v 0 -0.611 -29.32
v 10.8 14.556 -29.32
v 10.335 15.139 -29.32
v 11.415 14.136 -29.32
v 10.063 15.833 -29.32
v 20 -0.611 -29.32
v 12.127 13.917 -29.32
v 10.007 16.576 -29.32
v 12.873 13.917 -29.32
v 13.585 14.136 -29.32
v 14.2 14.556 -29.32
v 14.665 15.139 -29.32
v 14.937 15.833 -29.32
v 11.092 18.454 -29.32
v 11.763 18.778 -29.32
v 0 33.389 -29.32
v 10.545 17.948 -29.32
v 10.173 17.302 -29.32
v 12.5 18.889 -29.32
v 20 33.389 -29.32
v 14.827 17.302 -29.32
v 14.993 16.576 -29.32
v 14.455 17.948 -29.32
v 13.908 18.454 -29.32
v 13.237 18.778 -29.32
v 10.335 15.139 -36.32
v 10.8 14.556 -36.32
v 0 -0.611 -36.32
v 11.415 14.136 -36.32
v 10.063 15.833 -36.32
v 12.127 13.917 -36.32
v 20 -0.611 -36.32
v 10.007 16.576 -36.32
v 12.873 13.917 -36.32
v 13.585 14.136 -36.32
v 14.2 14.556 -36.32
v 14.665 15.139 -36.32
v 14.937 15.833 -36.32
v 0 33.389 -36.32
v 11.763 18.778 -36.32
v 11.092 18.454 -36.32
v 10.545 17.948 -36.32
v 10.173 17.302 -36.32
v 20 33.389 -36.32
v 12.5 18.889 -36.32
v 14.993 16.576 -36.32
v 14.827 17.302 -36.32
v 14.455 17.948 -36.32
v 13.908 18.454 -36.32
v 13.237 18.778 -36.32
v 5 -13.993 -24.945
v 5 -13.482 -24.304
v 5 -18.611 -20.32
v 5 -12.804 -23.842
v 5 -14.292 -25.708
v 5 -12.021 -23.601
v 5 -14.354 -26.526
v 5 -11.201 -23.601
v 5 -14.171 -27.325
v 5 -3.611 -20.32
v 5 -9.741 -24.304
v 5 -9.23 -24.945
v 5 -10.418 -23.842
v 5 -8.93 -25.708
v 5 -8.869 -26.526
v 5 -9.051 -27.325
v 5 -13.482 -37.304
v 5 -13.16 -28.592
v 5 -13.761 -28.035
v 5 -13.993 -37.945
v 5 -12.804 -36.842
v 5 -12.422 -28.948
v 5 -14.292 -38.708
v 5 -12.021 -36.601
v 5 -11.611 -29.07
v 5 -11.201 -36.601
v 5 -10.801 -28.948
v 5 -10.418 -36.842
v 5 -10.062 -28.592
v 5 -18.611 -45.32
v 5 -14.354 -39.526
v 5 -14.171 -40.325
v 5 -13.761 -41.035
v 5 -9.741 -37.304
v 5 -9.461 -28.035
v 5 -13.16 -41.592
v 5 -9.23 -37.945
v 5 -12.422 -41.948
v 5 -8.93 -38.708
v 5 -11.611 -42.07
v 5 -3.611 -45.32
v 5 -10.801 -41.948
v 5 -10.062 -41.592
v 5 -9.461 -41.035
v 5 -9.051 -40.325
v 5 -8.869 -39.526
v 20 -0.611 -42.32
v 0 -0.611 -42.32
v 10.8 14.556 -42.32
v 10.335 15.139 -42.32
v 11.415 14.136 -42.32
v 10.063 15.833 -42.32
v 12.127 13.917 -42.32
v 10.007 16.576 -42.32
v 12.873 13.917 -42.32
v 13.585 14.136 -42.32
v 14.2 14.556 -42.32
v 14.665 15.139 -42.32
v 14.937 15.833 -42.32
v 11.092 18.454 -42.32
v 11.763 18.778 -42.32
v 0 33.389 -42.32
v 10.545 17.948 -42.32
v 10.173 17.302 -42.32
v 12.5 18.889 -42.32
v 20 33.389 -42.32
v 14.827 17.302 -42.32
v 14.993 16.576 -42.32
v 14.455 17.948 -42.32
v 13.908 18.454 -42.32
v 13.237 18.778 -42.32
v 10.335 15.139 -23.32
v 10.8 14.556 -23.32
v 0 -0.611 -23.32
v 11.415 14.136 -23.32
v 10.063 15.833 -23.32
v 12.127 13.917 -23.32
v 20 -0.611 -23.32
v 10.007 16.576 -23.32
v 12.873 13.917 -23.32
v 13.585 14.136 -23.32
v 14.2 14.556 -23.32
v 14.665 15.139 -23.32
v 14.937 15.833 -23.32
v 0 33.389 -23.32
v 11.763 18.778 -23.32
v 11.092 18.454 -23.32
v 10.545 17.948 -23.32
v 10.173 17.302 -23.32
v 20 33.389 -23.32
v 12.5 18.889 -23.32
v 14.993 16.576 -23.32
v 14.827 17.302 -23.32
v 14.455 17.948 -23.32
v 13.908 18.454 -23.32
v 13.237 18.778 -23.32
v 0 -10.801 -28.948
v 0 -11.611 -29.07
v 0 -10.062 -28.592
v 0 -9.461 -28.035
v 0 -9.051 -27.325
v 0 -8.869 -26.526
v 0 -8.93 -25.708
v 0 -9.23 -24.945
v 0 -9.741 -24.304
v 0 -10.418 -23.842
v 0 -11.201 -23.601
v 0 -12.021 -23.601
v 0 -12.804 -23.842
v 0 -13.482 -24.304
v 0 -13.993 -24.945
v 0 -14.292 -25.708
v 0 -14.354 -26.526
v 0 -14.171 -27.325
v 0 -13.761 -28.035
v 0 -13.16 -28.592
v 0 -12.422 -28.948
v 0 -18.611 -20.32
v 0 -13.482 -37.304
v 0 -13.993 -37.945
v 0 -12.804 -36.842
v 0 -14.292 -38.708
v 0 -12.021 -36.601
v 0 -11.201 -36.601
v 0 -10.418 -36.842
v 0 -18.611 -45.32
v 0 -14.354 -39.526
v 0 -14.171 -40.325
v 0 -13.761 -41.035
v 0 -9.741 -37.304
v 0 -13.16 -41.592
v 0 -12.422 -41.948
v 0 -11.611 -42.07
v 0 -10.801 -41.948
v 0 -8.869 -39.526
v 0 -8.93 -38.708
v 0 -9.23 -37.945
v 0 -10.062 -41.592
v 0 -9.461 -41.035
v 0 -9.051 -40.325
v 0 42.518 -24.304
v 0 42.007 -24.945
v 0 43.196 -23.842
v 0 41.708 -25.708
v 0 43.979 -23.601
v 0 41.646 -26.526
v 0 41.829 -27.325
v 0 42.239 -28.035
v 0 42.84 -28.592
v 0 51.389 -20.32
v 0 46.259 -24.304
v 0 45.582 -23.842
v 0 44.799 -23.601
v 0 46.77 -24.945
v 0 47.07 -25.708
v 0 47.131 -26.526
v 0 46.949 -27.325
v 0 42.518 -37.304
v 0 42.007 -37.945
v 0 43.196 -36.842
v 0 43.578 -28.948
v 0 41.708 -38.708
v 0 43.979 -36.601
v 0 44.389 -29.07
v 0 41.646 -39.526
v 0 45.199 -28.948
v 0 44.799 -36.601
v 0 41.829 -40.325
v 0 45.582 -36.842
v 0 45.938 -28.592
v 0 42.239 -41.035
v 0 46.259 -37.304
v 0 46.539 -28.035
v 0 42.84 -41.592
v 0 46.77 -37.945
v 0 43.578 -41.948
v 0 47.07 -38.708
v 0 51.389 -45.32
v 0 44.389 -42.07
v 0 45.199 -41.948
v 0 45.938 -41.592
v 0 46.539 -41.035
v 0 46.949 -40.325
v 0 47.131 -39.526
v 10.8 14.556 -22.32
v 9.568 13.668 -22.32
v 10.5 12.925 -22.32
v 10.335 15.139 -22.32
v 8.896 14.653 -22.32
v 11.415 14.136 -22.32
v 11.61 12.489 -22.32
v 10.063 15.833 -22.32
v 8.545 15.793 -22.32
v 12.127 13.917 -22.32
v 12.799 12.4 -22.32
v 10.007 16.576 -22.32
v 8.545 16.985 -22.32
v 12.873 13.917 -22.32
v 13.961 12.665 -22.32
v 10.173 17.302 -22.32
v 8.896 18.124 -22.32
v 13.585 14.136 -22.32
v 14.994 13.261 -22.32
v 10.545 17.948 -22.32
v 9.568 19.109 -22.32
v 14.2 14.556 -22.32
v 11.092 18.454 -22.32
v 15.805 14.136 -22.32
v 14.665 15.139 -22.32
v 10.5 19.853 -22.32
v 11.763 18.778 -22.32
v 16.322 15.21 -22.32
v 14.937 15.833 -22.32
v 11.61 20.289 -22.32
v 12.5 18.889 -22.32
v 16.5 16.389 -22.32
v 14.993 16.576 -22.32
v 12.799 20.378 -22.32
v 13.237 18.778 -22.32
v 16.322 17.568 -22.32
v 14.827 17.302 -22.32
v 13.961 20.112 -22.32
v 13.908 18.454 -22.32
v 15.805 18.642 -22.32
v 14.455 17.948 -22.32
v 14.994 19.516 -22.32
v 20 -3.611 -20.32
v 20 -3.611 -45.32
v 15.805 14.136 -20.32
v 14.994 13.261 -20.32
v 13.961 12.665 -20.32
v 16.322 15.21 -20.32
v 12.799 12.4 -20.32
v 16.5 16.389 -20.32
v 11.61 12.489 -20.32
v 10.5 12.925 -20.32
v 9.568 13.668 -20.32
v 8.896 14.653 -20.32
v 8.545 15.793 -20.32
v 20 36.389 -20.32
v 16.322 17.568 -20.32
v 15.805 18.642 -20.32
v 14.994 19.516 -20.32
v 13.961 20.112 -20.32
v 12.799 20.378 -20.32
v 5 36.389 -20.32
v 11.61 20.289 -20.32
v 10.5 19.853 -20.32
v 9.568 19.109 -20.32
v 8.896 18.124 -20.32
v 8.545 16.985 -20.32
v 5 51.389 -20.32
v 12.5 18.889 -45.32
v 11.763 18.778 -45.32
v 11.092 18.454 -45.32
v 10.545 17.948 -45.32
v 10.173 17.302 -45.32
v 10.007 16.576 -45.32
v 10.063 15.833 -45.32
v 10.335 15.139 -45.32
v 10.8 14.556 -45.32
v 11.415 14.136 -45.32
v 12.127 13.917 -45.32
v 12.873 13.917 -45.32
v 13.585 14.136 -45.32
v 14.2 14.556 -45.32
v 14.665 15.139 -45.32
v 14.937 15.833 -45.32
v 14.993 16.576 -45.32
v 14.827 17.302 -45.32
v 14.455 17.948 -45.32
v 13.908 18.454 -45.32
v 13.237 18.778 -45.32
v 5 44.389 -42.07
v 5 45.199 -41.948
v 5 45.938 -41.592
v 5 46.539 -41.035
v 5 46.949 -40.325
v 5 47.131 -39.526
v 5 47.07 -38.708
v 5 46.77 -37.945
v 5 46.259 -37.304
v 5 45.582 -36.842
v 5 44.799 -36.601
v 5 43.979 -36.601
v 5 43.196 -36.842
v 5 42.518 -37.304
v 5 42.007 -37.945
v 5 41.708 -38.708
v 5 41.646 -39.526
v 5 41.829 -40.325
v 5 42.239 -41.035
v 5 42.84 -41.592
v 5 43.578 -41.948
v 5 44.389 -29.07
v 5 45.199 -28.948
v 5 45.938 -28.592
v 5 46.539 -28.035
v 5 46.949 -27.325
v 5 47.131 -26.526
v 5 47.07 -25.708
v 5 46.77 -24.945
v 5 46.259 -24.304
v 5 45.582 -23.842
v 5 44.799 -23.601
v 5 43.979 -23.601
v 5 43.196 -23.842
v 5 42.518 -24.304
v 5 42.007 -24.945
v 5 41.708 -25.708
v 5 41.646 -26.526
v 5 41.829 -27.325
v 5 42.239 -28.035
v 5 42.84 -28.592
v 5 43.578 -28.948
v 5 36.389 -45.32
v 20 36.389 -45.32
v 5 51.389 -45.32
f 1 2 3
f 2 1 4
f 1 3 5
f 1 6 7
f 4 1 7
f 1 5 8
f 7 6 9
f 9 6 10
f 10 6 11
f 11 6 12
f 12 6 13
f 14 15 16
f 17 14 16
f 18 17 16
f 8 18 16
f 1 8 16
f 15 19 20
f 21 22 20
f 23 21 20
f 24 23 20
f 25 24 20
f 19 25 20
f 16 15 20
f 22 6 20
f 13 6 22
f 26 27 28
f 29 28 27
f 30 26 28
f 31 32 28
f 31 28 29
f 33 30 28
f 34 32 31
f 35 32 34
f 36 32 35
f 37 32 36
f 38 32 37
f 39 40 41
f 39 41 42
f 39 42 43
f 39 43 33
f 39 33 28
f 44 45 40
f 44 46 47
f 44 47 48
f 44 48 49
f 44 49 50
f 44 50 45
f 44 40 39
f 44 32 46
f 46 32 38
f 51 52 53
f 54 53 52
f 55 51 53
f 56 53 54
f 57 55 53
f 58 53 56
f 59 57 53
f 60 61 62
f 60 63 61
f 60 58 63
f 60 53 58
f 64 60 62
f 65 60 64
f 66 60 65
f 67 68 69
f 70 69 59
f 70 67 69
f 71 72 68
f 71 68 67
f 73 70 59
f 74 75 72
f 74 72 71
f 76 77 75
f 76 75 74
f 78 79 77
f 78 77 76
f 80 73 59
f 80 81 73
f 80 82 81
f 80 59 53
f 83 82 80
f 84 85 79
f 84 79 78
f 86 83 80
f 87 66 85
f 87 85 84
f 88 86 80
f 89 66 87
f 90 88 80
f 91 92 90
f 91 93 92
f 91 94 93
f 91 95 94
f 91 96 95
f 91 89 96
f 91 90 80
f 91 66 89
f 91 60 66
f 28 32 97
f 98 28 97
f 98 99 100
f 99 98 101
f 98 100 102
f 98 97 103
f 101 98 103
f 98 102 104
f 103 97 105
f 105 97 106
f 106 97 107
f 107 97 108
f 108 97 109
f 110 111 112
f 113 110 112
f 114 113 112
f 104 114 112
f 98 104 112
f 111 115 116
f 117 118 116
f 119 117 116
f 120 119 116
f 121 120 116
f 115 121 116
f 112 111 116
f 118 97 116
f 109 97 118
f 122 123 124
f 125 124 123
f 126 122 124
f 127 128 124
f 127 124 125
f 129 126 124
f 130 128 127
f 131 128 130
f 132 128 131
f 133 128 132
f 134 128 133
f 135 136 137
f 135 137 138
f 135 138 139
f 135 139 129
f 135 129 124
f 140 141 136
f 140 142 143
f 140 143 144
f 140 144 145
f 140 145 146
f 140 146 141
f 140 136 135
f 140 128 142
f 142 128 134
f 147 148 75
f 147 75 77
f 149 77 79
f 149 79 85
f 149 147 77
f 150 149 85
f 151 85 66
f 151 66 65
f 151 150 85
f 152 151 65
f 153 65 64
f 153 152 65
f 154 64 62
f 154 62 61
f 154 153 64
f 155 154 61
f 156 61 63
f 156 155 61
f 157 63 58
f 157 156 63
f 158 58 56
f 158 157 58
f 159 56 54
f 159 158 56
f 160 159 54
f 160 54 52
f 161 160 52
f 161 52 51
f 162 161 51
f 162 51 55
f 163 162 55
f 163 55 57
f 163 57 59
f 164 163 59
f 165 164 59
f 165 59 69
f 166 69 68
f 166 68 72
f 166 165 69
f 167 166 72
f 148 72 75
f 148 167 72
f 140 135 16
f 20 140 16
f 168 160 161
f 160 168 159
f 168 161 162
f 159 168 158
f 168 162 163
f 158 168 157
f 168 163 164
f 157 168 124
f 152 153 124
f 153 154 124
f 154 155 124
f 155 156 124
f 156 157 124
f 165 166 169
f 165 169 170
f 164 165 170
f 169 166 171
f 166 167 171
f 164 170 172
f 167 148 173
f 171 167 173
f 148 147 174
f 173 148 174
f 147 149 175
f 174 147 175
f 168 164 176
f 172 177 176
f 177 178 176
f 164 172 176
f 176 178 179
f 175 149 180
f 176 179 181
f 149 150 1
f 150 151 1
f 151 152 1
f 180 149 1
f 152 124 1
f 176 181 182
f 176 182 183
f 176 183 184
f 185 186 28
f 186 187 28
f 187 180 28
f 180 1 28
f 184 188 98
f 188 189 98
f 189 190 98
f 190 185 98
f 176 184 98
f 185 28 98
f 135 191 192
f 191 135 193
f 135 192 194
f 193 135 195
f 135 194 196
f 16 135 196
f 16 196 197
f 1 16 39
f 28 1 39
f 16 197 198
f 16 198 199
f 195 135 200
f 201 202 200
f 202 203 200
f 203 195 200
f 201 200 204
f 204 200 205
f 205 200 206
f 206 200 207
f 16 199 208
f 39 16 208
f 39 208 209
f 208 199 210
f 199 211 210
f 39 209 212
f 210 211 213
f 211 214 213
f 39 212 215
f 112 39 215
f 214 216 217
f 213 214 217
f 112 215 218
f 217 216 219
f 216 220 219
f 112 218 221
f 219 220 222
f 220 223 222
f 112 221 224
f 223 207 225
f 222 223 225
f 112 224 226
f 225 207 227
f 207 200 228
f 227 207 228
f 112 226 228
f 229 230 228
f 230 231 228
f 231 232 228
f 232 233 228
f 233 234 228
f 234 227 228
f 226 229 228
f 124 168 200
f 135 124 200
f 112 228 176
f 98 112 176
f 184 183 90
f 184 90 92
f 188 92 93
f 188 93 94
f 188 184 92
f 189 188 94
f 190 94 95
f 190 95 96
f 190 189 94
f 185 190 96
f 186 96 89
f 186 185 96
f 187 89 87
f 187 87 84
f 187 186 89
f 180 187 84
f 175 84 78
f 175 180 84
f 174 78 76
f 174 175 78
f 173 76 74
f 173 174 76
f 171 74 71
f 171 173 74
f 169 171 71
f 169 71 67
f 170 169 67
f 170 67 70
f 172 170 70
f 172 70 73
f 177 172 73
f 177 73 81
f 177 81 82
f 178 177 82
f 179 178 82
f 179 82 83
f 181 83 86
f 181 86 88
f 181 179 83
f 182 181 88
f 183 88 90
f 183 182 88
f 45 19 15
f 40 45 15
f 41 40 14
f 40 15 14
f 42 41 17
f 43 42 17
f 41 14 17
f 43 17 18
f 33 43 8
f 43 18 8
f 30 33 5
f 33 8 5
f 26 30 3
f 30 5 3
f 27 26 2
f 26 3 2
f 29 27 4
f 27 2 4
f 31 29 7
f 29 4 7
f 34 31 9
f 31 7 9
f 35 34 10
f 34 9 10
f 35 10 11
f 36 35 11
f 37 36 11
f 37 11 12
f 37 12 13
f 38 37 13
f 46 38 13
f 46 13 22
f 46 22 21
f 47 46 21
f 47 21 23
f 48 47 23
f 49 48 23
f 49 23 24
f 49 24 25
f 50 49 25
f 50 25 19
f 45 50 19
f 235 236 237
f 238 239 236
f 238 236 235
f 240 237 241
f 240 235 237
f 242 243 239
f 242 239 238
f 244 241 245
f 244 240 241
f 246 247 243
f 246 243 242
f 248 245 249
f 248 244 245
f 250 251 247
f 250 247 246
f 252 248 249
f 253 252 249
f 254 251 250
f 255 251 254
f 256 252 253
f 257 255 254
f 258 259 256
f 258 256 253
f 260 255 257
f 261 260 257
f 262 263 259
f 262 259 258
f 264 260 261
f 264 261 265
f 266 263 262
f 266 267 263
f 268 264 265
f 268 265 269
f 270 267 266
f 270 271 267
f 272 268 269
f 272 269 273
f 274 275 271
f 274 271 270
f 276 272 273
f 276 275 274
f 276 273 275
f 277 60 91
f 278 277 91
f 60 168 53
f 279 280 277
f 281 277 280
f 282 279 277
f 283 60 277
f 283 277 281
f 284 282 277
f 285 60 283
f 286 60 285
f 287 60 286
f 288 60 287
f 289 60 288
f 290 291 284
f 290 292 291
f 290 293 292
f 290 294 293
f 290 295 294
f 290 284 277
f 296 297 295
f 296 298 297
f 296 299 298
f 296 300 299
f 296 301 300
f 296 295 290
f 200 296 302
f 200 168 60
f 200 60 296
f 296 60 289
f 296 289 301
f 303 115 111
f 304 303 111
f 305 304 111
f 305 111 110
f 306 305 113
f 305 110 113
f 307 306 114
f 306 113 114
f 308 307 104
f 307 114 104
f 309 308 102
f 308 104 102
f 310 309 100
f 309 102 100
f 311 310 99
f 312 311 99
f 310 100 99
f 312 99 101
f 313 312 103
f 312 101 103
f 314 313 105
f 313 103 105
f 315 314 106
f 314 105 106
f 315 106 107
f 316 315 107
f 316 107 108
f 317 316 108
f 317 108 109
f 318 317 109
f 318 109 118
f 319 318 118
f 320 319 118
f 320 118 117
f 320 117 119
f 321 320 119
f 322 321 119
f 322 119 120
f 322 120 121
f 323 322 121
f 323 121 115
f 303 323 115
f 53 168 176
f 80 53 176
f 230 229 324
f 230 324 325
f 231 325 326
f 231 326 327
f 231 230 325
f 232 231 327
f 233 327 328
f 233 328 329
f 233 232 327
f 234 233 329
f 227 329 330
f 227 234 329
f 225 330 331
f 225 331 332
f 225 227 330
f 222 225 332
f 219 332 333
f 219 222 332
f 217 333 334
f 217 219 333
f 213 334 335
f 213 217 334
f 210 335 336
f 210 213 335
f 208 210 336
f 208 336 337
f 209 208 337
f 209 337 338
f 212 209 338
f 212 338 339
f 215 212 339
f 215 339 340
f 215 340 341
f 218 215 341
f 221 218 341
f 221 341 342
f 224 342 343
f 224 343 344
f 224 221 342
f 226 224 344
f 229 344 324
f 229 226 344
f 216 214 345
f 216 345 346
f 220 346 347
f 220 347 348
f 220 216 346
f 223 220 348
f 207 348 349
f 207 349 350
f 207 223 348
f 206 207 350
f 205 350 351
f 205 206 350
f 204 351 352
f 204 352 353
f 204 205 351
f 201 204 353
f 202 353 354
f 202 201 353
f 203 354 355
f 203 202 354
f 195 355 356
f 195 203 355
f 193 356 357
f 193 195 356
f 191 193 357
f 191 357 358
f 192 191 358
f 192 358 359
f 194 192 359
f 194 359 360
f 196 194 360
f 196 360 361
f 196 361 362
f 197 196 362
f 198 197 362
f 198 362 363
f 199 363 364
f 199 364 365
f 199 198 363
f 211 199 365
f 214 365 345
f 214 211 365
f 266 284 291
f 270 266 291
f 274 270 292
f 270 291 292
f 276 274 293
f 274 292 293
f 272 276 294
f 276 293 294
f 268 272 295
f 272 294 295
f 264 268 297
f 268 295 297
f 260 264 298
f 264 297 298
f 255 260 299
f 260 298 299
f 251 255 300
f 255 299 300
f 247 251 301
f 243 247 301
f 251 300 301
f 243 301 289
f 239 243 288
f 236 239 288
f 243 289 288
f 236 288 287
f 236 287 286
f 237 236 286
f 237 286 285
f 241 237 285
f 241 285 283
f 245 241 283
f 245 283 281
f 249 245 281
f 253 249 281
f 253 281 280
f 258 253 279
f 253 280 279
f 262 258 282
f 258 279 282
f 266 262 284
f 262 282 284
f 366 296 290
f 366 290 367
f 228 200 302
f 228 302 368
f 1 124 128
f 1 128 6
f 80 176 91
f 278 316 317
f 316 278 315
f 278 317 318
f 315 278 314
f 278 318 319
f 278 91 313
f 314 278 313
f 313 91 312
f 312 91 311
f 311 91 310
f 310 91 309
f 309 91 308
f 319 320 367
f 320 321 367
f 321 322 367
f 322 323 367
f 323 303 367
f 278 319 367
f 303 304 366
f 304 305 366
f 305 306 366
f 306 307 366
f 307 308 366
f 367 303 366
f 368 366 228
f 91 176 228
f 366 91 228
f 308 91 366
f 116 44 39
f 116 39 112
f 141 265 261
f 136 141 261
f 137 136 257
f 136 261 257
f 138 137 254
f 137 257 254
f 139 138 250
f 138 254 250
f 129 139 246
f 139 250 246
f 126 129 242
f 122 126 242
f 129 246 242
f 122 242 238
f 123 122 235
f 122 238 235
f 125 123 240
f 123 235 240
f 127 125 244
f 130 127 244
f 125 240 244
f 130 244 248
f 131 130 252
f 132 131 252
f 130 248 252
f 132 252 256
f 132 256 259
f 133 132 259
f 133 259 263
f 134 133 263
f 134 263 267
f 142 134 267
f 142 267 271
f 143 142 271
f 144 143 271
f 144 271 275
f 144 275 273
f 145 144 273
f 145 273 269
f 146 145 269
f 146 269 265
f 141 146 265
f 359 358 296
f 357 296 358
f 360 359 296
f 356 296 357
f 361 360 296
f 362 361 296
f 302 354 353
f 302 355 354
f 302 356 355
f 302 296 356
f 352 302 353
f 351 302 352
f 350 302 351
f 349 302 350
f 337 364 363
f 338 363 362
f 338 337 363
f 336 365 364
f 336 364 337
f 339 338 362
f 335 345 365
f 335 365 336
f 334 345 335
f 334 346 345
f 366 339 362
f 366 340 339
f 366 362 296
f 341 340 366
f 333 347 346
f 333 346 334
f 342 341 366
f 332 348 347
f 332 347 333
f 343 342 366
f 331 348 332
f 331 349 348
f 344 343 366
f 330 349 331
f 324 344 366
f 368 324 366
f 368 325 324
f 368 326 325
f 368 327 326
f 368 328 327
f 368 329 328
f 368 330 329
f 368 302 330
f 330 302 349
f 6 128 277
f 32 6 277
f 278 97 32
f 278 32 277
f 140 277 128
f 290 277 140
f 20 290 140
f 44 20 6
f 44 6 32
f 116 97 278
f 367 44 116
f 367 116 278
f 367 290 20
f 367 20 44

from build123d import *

# Parameters (mm, degrees)
SKICA1_W                 = 25
SKICA1_H                 = 70
SKICA1_R                 = 2.75
P_IDAT_VYSUNUT_M1_DEPTH  = 5
SKICA2_W                 = 25
SKICA2_H                 = 40
P_IDAT_VYSUNUT_M2_DEPTH  = 15
SKICA3_W                 = 6
SKICA3_H                 = 34
ODEBRAT_VYSUNUT_M1_DEPTH = 72.377271817
SKICA4_R                 = 4
ODEBRAT_VYSUNUT_M2_DEPTH = 2
SKICA5_R                 = 2.5
ODEBRAT_VYSUNUT_M3_DEPTH = 60.747879831


with BuildPart() as part:
    # Skica1 → Přidat vysunutím1 (new body)
    with BuildSketch(Plane(origin=(0, 0, 0), x_dir=(0, 0, -1), z_dir=(1, 0, 0))):
        with Locations((32.820037376, 16.388803686)):
            Rectangle(SKICA1_W, SKICA1_H)
        with Locations((26.320037376, 44.388803686)):
            Circle(SKICA1_R, mode=Mode.SUBTRACT)
        with Locations((39.320037376, 44.388803686)):
            Circle(SKICA1_R, mode=Mode.SUBTRACT)
        with Locations((26.320037376, -11.611196314)):
            Circle(SKICA1_R, mode=Mode.SUBTRACT)
        with Locations((39.320037376, -11.611196314)):
            Circle(SKICA1_R, mode=Mode.SUBTRACT)
    extrude(amount=P_IDAT_VYSUNUT_M1_DEPTH)

    # Skica2 → Přidat vysunutím2 (add)
    with BuildSketch(Plane(origin=(5, 0, 0), x_dir=(0, 0, -1), z_dir=(1, 0, 0))):
        with Locations((32.820037376, 16.388803686)):
            Rectangle(SKICA2_W, SKICA2_H)
    extrude(amount=P_IDAT_VYSUNUT_M2_DEPTH)

    # Skica3 → Odebrat vysunutím1 (cut, through all)
    with BuildSketch(Plane(origin=(20, 0, 0), x_dir=(0, 0, -1), z_dir=(1, 0, 0))):
        with Locations((26.320037376, 16.388803686)):
            Rectangle(SKICA3_W, SKICA3_H)
        with Locations((39.320037376, 16.388803686)):
            Rectangle(SKICA3_W, SKICA3_H)
    extrude(amount=-ODEBRAT_VYSUNUT_M1_DEPTH, mode=Mode.SUBTRACT)

    # Skica4 → Odebrat vysunutím2 (cut)
    with BuildSketch(Plane.XY.offset(-20.320037376)):
        with Locations((12.5, 16.388803686)):
            Circle(SKICA4_R)
    extrude(amount=-ODEBRAT_VYSUNUT_M2_DEPTH, mode=Mode.SUBTRACT)

    # Skica5 → Odebrat vysunutím3 (cut, through all)
    with BuildSketch(Plane.XY.offset(-22.320037376)):
        with Locations(Location((12.5, 16.388803686, 0), (0, 0, 90))):
            Circle(SKICA5_R)
    extrude(amount=-ODEBRAT_VYSUNUT_M3_DEPTH, mode=Mode.SUBTRACT)


solid = part.part
